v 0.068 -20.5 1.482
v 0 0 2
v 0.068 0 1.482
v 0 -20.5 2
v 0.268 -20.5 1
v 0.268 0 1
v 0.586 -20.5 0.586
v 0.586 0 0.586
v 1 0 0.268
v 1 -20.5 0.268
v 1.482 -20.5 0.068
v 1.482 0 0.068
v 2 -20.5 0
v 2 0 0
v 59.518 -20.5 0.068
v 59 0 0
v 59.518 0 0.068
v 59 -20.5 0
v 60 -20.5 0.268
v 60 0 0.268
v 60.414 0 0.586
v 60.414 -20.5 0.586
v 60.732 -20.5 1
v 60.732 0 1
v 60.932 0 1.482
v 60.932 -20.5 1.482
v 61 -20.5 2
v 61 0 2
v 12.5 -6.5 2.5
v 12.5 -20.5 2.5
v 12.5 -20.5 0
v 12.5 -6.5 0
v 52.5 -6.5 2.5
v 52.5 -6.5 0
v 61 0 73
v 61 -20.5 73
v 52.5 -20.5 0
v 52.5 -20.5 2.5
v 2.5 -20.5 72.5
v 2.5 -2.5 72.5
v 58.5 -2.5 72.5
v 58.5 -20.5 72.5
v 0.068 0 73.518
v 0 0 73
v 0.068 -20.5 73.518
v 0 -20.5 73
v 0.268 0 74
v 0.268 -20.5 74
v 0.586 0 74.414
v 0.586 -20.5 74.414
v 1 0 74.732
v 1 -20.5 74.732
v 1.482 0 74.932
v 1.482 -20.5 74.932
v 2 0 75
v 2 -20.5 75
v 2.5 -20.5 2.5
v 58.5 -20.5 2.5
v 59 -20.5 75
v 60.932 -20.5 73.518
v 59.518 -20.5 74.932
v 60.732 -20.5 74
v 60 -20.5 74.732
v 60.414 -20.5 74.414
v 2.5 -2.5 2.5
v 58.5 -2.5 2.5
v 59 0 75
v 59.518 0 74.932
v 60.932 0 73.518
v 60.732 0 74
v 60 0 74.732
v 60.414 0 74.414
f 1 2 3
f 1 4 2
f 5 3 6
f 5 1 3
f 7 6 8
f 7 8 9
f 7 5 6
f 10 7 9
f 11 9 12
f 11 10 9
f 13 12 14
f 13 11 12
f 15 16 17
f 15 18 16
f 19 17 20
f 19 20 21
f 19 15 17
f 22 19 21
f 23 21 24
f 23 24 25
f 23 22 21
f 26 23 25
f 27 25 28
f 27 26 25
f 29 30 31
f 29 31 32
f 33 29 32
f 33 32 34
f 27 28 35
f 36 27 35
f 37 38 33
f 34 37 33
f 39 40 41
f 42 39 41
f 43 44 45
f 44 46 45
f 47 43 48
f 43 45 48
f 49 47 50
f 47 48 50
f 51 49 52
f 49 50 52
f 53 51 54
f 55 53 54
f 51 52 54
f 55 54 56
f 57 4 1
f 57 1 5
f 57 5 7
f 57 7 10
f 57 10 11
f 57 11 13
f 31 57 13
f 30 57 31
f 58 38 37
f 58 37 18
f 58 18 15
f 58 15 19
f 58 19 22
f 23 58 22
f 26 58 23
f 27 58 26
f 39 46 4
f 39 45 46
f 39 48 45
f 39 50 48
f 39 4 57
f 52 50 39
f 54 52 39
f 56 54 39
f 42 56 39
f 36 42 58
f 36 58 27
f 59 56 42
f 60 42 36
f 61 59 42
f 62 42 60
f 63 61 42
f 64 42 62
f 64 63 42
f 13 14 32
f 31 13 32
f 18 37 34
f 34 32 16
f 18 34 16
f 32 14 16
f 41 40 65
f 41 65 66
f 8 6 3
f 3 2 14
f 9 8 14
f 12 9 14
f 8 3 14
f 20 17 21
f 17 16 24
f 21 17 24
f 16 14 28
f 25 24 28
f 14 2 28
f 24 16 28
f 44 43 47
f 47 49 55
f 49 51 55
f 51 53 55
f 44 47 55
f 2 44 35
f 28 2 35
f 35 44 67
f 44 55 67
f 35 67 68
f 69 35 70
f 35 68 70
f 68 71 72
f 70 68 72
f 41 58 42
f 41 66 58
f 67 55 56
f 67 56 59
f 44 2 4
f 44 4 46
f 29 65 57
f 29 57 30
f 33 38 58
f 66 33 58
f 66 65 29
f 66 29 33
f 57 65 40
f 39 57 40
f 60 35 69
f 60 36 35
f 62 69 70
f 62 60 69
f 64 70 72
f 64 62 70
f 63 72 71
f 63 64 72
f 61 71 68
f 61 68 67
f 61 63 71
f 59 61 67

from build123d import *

# Parameters (mm, degrees)
F0_W     = 61
F0_H     = 75
F1_DEPTH = 20.5
F2_R     = 2
F3_T     = -2.5
F4_W     = 40
F4_H     = 14
F5_DEPTH = 25


with BuildPart() as f1:
    # F0 (on Front) → F1 (new body)
    with BuildSketch(Plane.XZ):
        with Locations((30.5, 37.5)):
            Rectangle(F0_W, F0_H)
    extrude(amount=F1_DEPTH)

    # F2
    f2_edges = [f1.edges().sort_by_distance(p)[0] for p in [
        (0, -10.25, 75),
        (61, -10.25, 75),
        (61, -10.25, 0),
        (0, -10.25, 0),
    ]]
    fillet(f2_edges, radius=F2_R)

    # F3
    f3_openings = [f1.faces().sort_by_distance(p)[0] for p in [
        (30.5, -20.5, 37.5),
    ]]
    offset(amount=F3_T, openings=f3_openings)

    # F4 (on face) → F5 (cut)
    with BuildSketch(Plane.XY.offset(2.5)):
        with Locations((32.5, -13.5)):
            Rectangle(F4_W, F4_H)
    extrude(amount=-F5_DEPTH, mode=Mode.SUBTRACT)


solid = f1.part
